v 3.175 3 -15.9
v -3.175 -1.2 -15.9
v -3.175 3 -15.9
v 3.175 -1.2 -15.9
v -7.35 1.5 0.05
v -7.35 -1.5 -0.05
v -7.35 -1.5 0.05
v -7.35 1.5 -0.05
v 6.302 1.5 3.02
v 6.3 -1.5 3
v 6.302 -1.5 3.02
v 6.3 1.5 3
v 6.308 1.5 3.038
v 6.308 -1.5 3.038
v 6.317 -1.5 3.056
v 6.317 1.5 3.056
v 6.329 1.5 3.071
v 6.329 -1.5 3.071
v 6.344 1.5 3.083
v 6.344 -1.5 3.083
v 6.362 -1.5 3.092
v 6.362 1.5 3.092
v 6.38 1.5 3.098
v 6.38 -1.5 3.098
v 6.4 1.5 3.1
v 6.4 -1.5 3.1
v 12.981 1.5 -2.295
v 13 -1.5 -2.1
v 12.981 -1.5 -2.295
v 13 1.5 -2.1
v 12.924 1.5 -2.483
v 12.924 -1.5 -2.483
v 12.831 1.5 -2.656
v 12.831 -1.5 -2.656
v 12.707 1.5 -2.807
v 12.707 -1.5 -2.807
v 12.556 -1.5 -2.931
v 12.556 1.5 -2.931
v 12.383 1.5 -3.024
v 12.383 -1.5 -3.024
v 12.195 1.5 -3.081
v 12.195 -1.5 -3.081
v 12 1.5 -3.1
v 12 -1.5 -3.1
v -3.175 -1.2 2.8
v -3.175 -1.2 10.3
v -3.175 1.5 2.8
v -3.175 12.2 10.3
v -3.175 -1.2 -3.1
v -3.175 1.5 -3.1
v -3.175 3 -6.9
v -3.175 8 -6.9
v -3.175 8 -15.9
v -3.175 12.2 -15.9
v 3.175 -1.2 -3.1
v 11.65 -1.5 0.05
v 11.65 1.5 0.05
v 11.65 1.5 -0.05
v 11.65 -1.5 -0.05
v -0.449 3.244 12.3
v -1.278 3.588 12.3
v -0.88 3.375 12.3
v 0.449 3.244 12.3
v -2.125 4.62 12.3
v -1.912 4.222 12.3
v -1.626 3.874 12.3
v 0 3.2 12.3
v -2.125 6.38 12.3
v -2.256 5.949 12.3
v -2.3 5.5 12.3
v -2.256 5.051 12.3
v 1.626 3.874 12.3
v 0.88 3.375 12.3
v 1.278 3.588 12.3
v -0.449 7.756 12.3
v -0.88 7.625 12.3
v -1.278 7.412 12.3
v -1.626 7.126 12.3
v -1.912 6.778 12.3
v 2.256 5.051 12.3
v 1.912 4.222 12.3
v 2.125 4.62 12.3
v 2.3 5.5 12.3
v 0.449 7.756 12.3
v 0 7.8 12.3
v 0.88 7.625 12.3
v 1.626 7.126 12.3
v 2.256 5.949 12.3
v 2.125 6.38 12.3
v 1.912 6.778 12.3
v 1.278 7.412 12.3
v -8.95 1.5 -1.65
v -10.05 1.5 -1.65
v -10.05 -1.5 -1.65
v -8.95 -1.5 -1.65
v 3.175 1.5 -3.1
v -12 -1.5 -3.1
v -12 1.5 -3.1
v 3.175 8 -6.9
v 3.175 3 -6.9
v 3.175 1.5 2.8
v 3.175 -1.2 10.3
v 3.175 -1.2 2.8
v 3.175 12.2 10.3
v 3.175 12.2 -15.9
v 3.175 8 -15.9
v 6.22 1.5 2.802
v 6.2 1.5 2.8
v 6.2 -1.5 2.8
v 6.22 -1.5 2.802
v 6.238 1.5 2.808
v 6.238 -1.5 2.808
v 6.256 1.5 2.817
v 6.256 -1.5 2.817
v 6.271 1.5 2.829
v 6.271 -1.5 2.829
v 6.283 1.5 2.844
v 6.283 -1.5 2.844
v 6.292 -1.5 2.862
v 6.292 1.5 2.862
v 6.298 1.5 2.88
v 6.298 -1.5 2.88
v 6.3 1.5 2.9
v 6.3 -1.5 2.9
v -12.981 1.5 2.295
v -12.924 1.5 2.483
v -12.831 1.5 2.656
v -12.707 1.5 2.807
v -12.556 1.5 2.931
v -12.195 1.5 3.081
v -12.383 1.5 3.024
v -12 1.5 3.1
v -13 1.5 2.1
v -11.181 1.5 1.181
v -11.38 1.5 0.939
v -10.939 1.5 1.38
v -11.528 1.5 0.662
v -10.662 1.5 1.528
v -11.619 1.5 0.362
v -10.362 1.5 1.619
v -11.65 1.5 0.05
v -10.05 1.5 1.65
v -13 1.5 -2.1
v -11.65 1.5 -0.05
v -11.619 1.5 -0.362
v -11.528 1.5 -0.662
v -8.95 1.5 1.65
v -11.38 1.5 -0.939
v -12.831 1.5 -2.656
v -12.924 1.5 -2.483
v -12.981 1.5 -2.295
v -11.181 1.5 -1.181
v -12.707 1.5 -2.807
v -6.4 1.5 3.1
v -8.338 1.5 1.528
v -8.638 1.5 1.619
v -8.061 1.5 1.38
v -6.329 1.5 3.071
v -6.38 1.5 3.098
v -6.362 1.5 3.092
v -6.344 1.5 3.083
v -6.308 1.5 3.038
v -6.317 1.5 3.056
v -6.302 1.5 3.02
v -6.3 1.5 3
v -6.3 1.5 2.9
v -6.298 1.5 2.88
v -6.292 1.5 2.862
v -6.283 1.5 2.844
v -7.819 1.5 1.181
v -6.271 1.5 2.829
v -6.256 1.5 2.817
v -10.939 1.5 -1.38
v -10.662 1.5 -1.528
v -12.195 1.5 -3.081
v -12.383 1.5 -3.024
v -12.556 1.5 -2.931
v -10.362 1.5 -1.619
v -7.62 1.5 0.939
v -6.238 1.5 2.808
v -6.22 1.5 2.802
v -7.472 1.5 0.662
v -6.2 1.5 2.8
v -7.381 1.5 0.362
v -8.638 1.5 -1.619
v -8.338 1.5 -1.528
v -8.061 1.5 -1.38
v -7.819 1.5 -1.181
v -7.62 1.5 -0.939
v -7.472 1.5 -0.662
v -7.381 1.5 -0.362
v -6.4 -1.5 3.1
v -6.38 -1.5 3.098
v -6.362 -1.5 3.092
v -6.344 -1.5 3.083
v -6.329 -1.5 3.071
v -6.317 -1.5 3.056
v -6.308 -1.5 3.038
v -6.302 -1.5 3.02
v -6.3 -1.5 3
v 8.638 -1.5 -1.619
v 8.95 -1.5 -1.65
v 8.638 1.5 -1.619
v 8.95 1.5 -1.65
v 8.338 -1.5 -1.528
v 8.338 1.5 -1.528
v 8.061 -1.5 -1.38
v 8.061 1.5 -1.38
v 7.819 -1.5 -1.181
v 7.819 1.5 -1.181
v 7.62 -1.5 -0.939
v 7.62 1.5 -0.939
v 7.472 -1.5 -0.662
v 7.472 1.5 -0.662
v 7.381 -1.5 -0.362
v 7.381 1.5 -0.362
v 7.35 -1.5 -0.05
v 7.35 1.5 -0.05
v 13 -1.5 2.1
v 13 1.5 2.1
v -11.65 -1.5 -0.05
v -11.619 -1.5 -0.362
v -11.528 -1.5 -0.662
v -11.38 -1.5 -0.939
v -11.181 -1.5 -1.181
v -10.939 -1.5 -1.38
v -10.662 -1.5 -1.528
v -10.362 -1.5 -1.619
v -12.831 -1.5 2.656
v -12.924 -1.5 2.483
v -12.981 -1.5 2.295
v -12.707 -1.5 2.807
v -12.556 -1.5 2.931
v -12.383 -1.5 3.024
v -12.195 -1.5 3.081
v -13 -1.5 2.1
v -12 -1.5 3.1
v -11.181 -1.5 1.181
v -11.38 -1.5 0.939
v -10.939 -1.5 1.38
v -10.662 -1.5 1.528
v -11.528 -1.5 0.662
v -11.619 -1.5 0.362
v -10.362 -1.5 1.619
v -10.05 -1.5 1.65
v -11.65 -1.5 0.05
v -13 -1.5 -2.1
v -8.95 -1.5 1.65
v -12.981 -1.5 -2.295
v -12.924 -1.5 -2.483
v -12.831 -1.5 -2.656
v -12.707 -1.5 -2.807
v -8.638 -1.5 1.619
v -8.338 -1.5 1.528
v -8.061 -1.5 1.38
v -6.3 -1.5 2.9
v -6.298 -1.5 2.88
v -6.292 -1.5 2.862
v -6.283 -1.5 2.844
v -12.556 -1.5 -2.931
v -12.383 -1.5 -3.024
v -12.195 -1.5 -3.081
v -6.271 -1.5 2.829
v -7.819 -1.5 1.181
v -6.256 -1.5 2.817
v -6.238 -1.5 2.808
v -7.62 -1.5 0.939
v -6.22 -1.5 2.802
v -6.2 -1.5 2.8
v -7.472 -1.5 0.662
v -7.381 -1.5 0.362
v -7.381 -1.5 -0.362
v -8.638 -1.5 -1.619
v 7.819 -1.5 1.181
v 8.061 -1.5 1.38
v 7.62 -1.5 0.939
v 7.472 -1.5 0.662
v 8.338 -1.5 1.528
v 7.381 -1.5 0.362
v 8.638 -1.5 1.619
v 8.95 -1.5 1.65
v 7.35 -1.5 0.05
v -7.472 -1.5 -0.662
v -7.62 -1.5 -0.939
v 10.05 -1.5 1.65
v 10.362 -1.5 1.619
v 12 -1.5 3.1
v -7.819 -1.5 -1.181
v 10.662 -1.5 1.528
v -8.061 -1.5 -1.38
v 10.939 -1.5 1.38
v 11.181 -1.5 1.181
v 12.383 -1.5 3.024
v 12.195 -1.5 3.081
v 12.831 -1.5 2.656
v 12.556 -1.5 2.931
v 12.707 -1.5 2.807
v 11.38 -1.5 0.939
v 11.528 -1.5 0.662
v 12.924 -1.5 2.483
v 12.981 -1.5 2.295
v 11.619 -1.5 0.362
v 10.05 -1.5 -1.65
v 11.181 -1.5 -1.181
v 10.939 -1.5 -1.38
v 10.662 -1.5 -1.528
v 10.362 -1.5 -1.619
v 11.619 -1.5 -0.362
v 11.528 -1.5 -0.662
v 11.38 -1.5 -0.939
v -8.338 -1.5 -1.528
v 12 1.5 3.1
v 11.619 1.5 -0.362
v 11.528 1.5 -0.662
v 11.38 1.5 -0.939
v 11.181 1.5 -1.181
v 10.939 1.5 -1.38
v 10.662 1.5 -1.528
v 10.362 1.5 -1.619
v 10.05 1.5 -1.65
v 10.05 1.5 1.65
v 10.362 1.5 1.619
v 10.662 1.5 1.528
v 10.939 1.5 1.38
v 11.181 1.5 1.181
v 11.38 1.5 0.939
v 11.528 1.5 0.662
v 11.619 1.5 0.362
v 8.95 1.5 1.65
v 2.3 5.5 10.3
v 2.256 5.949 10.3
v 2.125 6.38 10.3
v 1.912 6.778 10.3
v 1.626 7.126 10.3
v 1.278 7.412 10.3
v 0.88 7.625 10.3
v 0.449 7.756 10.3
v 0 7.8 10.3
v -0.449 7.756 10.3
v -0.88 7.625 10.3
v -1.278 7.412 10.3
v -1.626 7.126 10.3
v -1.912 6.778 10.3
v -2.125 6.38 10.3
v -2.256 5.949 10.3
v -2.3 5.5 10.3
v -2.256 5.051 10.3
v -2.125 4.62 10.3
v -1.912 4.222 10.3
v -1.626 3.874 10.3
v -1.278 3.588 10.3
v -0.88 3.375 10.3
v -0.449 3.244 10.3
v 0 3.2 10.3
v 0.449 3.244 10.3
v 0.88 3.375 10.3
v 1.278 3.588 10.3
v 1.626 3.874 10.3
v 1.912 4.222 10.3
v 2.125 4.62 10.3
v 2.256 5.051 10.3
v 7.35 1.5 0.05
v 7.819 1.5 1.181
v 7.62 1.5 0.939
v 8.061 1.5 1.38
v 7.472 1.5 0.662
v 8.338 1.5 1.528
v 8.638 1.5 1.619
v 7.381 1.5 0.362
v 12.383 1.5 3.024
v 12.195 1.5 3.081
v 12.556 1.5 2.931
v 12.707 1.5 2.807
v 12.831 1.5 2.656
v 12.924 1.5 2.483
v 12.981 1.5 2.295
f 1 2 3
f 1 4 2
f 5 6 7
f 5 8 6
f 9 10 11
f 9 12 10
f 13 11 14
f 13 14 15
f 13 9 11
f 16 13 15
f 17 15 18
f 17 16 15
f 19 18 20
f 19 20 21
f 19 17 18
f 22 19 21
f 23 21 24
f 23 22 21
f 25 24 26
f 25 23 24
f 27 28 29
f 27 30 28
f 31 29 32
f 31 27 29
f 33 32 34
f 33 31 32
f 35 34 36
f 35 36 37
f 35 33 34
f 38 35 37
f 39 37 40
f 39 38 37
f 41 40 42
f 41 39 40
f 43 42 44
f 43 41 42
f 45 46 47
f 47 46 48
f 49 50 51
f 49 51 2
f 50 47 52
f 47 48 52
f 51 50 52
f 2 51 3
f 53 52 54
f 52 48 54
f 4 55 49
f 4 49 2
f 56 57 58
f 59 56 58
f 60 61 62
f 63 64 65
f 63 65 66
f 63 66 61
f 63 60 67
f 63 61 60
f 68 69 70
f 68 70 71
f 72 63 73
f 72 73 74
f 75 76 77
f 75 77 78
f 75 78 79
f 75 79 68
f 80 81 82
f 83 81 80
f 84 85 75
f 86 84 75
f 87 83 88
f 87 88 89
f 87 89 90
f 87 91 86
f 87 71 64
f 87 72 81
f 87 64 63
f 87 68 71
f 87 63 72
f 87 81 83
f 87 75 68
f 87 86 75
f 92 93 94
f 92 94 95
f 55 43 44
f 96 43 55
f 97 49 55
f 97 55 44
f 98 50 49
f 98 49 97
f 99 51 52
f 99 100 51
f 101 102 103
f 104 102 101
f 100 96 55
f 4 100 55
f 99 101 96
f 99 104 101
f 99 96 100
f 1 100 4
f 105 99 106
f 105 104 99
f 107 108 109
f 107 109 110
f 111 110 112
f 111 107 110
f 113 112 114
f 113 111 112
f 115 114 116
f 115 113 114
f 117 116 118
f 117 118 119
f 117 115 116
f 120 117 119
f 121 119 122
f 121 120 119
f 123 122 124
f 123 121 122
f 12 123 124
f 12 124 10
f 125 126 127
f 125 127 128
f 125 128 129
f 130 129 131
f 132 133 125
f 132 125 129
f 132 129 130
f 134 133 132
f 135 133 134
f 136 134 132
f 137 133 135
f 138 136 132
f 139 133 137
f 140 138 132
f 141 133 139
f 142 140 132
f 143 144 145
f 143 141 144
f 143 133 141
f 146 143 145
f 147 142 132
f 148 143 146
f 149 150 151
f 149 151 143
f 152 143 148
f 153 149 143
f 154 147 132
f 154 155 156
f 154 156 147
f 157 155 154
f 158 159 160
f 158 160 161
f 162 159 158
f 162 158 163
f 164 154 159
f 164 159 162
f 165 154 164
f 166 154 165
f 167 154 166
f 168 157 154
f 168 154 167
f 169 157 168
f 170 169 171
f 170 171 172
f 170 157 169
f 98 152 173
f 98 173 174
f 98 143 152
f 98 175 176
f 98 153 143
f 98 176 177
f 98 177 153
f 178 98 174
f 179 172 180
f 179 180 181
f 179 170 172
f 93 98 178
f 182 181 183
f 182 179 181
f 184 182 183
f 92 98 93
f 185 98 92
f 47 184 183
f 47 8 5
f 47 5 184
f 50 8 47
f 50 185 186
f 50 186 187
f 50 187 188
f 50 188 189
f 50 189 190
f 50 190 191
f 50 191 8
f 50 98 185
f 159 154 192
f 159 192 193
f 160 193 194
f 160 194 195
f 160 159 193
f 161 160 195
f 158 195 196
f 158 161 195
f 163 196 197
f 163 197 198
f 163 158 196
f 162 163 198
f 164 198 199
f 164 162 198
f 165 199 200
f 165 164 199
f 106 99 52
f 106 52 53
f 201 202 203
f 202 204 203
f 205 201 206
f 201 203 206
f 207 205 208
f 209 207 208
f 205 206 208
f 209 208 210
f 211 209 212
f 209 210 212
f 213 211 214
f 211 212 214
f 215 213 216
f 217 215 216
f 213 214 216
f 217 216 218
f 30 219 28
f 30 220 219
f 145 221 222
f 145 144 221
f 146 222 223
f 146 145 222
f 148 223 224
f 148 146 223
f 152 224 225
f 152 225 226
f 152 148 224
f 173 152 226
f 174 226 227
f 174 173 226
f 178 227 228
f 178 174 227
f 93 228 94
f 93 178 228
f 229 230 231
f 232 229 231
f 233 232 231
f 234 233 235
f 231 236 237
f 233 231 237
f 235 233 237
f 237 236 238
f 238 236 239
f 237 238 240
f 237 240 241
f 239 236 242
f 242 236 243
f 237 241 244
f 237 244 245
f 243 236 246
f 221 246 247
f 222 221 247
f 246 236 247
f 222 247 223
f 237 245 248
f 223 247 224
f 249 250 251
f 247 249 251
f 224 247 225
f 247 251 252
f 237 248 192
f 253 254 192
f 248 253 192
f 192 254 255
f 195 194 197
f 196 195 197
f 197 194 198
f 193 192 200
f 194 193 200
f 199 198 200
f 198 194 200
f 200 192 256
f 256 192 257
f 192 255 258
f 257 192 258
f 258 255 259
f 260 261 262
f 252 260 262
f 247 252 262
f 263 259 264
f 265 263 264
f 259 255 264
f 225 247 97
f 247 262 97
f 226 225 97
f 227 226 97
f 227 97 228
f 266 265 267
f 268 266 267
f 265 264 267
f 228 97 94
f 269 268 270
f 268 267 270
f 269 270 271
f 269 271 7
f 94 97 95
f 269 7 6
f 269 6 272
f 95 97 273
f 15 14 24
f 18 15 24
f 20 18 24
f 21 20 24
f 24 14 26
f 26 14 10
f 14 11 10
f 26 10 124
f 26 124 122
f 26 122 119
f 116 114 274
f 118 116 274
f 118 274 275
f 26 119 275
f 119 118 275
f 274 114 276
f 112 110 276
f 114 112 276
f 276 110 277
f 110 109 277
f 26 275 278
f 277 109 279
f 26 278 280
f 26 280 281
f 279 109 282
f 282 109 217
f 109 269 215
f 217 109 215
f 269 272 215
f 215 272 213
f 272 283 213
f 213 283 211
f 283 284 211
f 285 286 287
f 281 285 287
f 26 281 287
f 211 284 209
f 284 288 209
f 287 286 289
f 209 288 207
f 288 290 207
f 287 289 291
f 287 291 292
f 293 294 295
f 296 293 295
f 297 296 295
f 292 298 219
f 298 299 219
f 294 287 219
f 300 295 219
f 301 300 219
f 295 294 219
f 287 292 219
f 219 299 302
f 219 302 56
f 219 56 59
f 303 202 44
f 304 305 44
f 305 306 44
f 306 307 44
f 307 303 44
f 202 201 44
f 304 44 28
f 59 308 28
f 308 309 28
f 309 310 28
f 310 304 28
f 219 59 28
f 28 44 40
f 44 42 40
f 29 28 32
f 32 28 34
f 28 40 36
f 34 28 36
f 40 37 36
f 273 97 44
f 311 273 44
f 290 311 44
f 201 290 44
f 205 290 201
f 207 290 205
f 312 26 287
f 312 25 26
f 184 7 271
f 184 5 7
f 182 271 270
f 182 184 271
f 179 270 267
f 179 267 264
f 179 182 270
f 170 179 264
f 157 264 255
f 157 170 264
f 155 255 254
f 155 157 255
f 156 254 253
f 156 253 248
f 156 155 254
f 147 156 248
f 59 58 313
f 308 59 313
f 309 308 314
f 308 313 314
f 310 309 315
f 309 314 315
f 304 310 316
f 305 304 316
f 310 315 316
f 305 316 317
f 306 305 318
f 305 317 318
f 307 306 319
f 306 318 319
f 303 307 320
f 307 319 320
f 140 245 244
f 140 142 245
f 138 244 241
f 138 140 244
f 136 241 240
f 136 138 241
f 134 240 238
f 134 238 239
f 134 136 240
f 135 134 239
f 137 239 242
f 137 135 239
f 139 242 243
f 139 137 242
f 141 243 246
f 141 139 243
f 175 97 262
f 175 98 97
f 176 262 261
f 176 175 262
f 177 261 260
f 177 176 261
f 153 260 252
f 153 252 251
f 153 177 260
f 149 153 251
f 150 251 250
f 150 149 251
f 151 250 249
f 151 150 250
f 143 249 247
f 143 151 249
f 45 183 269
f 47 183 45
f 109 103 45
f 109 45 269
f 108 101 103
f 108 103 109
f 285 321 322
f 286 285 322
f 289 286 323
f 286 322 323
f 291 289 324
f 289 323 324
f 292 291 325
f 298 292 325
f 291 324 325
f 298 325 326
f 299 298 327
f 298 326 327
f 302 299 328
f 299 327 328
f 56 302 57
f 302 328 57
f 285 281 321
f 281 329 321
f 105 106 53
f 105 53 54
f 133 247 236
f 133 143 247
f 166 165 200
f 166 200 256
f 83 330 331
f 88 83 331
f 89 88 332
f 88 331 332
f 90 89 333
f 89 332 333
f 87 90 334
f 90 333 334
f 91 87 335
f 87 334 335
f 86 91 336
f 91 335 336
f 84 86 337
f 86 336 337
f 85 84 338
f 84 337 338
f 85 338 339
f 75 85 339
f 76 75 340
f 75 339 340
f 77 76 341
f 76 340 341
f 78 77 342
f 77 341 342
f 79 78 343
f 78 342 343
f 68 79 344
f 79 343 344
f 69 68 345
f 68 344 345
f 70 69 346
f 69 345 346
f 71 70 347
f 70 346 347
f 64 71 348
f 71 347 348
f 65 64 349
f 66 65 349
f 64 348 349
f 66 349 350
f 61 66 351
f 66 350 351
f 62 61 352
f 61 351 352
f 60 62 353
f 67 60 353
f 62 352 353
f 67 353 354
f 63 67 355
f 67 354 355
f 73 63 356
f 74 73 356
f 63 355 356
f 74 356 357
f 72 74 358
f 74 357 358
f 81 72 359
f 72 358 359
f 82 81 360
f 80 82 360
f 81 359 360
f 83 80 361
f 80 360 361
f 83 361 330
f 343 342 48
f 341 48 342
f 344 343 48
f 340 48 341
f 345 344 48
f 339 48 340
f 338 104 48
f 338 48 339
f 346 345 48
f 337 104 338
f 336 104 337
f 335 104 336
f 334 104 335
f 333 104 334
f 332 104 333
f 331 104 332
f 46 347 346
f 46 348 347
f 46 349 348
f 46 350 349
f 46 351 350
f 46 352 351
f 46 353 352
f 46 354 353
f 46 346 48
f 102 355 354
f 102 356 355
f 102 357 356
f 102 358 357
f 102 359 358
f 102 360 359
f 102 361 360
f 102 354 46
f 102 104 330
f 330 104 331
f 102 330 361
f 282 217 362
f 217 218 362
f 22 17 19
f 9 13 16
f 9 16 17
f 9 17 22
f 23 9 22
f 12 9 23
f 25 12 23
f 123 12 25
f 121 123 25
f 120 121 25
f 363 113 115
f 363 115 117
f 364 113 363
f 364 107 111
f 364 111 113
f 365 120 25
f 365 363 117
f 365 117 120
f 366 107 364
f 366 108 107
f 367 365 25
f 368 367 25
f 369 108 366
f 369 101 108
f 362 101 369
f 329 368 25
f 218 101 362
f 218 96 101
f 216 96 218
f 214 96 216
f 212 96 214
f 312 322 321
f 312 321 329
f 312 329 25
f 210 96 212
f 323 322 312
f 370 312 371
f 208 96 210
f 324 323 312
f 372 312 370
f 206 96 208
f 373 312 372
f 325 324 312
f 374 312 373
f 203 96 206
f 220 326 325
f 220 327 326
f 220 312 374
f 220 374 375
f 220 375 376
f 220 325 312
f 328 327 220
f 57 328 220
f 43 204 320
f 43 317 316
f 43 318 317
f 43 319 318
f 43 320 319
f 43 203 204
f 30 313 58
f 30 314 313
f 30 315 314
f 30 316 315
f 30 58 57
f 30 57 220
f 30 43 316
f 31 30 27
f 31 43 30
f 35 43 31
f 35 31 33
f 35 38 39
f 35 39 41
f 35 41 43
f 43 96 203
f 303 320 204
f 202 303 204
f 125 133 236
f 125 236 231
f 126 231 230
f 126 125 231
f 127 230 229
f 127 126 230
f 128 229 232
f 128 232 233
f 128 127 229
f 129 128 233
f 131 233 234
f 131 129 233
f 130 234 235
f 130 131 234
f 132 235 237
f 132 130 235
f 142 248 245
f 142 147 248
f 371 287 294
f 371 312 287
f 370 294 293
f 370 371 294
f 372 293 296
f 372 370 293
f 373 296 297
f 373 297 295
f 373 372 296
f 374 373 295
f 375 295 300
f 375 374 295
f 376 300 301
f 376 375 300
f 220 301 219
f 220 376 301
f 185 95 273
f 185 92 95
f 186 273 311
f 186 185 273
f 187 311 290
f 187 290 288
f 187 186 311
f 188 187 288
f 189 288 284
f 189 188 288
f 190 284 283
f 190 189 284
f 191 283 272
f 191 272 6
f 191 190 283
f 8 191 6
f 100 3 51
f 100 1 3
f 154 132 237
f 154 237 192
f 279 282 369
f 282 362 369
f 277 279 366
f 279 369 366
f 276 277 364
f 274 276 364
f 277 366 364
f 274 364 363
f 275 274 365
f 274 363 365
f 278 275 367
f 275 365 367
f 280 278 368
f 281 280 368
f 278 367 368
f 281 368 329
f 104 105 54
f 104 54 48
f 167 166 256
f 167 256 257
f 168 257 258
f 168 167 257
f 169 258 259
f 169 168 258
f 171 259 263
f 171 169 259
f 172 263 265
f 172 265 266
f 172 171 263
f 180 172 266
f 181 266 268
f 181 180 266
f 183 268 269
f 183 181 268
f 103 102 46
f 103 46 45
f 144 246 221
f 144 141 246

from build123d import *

# Parameters (mm, degrees)
EXTRUDE_1_DEPTH = 1.5
EXTRUDE_2_DEPTH = 3.175
SKETCH_9_R      = 2.3
EXTRUDE_3_DEPTH = 2


with BuildPart() as part:
    # 草图1 → 凸台-拉伸1 (new, symmetric)
    with BuildSketch(Plane(origin=(0, 0, 0), x_dir=(1, 0, 0), z_dir=(0, 1, 0))):
        with BuildLine():
            Line((-13, 2.1), (-13, -2.1))
            ThreePointArc((-13, -2.1), (-12.707106781, -2.807106781), (-12, -3.1))
            Line((-12, -3.1), (-6.4, -3.1))
            ThreePointArc((-6.4, -3.1), (-6.329289322, -3.070710678), (-6.3, -3))
            Line((-6.3, -3), (-6.3, -2.9))
            ThreePointArc((-6.3, -2.9), (-6.270710678, -2.829289322), (-6.2, -2.8))
            Line((-6.2, -2.8), (6.2, -2.8))
            ThreePointArc((6.2, -2.8), (6.270710678, -2.829289322), (6.3, -2.9))
            Line((6.3, -2.9), (6.3, -3))
            ThreePointArc((6.3, -3), (6.329289322, -3.070710678), (6.4, -3.1))
            Line((6.4, -3.1), (12, -3.1))
            ThreePointArc((12, -3.1), (12.707106781, -2.807106781), (13, -2.1))
            Line((13, -2.1), (13, 2.1))
            ThreePointArc((13, 2.1), (12.707106781, 2.807106781), (12, 3.1))
            Line((12, 3.1), (-12, 3.1))
            ThreePointArc((-12, 3.1), (-12.707106781, 2.807106781), (-13, 2.1))
        make_face()
        with BuildLine():
            Line((10.05, 1.65), (8.95, 1.65))
            ThreePointArc((8.95, 1.65), (7.81862915, 1.18137085), (7.35, 0.05))
            Line((7.35, 0.05), (7.35, -0.05))
            ThreePointArc((7.35, -0.05), (7.81862915, -1.18137085), (8.95, -1.65))
            Line((8.95, -1.65), (10.05, -1.65))
            ThreePointArc((10.05, -1.65), (11.18137085, -1.18137085), (11.65, -0.05))
            Line((11.65, -0.05), (11.65, 0.05))
            ThreePointArc((11.65, 0.05), (11.18137085, 1.18137085), (10.05, 1.65))
        make_face(mode=Mode.SUBTRACT)
        with BuildLine():
            Line((-10.05, 1.65), (-8.95, 1.65))
            ThreePointArc((-8.95, 1.65), (-7.81862915, 1.18137085), (-7.35, 0.05))
            Line((-7.35, 0.05), (-7.35, -0.05))
            ThreePointArc((-7.35, -0.05), (-7.81862915, -1.18137085), (-8.95, -1.65))
            Line((-8.95, -1.65), (-10.05, -1.65))
            ThreePointArc((-10.05, -1.65), (-11.18137085, -1.18137085), (-11.65, -0.05))
            Line((-11.65, -0.05), (-11.65, 0.05))
            ThreePointArc((-11.65, 0.05), (-11.18137085, 1.18137085), (-10.05, 1.65))
        make_face(mode=Mode.SUBTRACT)
    extrude(amount=EXTRUDE_1_DEPTH, both=True)

    # 草图8 → 凸台-拉伸2 (add, symmetric)
    with BuildSketch(Plane(origin=(0, 0, 0), x_dir=(0, 0, -1), z_dir=(1, 0, 0))):
        Polygon((6.9, 3), (6.9, 8), (15.9, 8), (15.9, 12.2), (-10.3, 12.2), (-10.3, -1.2), (15.9, -1.2), (15.9, 3), align=None)
    extrude(amount=EXTRUDE_2_DEPTH, both=True)

    # 草图9 → 凸台-拉伸3 (add)
    with BuildSketch(Plane.XY.offset(10.3)):
        with Locations((0, 5.5)):
            Circle(SKETCH_9_R)
    extrude(amount=EXTRUDE_3_DEPTH)


solid = part.part
